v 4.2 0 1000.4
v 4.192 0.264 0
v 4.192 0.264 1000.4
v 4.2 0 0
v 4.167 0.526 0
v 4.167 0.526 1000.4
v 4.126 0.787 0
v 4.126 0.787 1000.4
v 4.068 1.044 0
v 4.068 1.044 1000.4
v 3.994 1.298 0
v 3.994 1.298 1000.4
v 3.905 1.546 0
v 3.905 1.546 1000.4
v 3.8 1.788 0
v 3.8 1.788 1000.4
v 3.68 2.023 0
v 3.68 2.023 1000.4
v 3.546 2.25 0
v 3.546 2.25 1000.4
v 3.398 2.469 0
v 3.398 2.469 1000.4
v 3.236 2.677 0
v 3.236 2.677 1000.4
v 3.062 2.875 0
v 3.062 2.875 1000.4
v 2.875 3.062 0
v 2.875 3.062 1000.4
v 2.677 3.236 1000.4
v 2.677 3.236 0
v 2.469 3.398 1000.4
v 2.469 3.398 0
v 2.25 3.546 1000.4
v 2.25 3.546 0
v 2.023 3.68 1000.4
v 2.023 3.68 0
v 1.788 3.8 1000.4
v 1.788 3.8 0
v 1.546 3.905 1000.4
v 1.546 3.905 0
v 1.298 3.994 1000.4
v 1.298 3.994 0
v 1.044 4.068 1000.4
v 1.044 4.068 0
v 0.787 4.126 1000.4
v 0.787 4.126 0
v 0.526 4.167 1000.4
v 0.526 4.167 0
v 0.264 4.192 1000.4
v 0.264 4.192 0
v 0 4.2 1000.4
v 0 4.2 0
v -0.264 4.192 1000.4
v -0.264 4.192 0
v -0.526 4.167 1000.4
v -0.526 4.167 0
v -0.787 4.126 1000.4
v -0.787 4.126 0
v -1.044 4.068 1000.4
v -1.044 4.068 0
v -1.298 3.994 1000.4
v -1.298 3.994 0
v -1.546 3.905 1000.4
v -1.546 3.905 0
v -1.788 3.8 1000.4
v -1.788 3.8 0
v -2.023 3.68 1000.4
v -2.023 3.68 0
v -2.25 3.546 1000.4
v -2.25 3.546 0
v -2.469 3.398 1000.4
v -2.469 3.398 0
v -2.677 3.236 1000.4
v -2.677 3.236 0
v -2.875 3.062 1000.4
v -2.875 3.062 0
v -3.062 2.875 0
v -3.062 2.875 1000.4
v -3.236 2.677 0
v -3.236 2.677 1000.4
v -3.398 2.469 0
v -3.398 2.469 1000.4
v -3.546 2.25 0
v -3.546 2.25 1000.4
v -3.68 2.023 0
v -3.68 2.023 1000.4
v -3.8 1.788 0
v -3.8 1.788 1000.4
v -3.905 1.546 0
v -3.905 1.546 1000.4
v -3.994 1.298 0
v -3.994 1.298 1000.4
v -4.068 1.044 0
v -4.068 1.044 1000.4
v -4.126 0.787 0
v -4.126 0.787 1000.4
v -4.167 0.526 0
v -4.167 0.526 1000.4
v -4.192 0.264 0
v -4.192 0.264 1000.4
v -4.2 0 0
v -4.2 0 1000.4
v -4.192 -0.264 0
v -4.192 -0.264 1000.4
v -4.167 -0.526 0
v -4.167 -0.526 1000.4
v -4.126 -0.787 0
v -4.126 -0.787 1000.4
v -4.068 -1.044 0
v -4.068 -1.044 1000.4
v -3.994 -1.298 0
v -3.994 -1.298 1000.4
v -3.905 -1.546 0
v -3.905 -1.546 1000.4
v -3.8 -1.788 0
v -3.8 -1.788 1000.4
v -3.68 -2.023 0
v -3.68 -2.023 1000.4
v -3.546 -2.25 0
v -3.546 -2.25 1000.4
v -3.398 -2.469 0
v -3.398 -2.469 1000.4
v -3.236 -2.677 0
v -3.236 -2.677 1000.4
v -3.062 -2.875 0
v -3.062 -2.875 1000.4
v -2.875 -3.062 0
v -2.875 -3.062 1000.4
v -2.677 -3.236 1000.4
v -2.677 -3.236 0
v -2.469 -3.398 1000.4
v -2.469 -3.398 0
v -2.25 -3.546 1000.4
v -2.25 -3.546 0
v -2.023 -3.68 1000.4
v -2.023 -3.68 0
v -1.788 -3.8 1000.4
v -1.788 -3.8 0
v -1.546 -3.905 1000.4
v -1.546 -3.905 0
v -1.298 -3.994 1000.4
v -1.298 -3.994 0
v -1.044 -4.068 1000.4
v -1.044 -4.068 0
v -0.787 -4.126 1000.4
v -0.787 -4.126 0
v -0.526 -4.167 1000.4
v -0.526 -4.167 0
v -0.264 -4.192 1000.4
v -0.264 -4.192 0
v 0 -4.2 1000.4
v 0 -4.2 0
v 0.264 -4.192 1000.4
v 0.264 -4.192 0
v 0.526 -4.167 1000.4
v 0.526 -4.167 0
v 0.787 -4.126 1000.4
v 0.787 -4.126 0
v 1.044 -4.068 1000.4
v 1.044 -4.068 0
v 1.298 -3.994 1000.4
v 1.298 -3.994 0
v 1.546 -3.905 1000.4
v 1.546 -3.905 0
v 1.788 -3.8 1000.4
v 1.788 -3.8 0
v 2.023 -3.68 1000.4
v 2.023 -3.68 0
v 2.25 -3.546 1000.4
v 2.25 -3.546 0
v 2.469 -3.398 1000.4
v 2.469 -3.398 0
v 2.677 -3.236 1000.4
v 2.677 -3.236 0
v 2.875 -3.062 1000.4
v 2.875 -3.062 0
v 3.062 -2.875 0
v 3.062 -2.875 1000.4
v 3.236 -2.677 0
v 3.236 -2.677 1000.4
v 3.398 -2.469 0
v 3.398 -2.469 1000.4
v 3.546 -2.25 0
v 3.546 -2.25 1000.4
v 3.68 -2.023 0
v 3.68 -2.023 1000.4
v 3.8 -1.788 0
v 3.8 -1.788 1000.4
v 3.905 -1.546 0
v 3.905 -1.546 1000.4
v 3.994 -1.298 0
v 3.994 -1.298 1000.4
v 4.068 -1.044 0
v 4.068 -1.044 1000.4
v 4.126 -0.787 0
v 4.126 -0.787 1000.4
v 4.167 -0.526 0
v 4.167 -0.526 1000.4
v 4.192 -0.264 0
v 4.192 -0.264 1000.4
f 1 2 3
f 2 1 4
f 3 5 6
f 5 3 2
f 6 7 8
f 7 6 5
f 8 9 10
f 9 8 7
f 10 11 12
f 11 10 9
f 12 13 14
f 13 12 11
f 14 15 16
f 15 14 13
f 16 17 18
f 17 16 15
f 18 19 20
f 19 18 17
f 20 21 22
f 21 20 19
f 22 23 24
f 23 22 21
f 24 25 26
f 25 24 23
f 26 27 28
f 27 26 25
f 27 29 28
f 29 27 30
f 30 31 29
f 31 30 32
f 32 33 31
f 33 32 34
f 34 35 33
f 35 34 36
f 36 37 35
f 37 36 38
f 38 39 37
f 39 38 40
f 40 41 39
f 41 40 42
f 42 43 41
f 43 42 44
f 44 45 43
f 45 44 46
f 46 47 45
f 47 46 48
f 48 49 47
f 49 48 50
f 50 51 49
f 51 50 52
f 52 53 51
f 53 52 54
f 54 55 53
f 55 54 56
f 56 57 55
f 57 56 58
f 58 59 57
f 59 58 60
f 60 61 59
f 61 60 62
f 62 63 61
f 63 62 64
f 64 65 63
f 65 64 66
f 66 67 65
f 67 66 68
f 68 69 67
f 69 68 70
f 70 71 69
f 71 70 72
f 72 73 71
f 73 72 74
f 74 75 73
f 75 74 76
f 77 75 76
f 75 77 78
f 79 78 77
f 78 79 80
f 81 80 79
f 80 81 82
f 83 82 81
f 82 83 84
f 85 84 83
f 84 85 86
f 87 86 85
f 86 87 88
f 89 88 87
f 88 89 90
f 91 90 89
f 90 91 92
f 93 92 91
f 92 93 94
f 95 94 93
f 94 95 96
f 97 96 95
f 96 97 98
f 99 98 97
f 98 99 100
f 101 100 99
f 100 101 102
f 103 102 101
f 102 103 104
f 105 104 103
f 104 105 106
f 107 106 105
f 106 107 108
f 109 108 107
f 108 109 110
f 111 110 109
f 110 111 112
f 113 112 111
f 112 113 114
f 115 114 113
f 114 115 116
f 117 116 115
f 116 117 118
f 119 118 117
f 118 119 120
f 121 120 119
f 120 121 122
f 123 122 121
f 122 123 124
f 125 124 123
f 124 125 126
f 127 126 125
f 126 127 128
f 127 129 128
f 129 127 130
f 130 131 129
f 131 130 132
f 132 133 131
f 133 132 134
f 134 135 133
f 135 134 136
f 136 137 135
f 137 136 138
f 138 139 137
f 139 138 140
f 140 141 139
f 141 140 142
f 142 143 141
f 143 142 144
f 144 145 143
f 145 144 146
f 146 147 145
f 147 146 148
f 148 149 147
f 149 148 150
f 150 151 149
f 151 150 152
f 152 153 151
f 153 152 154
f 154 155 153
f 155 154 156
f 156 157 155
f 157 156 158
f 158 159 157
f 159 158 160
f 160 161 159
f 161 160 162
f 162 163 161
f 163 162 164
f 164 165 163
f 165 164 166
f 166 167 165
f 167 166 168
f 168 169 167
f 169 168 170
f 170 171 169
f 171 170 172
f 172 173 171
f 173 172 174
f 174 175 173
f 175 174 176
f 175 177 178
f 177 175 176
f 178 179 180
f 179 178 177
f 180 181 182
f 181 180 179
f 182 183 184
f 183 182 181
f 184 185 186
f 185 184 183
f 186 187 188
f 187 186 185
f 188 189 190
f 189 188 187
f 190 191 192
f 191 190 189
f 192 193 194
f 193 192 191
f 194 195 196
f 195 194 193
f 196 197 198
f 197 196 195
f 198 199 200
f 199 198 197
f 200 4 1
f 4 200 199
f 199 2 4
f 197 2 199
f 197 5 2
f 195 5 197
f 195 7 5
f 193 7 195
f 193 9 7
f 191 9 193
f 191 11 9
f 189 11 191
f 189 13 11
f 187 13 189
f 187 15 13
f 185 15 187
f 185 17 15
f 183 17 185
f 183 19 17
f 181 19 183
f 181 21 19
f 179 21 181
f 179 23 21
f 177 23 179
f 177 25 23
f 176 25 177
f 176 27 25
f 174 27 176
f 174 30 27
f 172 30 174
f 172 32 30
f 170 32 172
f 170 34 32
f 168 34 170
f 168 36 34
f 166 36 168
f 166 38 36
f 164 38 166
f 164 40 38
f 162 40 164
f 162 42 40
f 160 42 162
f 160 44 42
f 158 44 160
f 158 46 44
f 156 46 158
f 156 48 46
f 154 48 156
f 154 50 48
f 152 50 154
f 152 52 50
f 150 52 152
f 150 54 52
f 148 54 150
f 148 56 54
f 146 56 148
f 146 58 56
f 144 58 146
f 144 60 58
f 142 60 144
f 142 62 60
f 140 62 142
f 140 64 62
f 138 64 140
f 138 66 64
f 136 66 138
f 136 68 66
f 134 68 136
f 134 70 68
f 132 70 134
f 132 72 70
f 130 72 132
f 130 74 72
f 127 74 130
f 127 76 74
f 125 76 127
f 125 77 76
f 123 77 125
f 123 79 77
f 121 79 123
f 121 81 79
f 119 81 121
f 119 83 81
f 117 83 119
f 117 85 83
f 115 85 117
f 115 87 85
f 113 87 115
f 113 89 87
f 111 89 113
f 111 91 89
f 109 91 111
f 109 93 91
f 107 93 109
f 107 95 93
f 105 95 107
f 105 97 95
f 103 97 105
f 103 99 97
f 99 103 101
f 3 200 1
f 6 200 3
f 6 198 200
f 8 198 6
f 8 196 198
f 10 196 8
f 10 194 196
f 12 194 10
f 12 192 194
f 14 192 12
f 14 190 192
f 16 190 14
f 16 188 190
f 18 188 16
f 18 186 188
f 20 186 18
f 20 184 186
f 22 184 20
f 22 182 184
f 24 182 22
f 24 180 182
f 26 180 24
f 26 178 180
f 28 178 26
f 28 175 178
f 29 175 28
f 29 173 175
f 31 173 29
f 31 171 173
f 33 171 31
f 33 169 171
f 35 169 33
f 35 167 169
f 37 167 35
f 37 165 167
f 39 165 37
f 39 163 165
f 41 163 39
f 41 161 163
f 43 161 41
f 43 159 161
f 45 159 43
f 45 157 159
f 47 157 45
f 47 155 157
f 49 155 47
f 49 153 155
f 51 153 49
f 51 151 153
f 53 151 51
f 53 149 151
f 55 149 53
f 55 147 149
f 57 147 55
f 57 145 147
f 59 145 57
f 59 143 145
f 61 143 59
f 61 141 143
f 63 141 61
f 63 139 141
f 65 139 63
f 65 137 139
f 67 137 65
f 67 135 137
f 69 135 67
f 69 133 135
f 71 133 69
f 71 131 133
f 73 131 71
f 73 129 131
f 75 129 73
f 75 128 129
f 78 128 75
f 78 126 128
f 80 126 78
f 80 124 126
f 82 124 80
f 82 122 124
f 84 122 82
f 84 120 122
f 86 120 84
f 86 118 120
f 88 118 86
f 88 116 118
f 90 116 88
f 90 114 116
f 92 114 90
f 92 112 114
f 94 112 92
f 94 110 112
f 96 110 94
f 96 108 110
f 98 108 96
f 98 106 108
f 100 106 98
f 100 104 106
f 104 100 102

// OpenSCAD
function 8mmRodLength(3dPrinterTolerance=.4)=1000+3dPrinterTolerance;
function 8mmRodDiameter(3dPrinterTolerance=.4)=8+3dPrinterTolerance;  //base case: 8
function 8mmRodRadius(3dPrinterTolerance=.4)=8mmRodDiameter()/2;

module 8mmRod(3dPrinterTolerance=.4)
{
color("Silver")
cylinder(h=8mmRodLength(3dPrinterTolerance), r=8mmRodRadius(3dPrinterTolerance), $fn=100);
}

8mmRod(.4);
